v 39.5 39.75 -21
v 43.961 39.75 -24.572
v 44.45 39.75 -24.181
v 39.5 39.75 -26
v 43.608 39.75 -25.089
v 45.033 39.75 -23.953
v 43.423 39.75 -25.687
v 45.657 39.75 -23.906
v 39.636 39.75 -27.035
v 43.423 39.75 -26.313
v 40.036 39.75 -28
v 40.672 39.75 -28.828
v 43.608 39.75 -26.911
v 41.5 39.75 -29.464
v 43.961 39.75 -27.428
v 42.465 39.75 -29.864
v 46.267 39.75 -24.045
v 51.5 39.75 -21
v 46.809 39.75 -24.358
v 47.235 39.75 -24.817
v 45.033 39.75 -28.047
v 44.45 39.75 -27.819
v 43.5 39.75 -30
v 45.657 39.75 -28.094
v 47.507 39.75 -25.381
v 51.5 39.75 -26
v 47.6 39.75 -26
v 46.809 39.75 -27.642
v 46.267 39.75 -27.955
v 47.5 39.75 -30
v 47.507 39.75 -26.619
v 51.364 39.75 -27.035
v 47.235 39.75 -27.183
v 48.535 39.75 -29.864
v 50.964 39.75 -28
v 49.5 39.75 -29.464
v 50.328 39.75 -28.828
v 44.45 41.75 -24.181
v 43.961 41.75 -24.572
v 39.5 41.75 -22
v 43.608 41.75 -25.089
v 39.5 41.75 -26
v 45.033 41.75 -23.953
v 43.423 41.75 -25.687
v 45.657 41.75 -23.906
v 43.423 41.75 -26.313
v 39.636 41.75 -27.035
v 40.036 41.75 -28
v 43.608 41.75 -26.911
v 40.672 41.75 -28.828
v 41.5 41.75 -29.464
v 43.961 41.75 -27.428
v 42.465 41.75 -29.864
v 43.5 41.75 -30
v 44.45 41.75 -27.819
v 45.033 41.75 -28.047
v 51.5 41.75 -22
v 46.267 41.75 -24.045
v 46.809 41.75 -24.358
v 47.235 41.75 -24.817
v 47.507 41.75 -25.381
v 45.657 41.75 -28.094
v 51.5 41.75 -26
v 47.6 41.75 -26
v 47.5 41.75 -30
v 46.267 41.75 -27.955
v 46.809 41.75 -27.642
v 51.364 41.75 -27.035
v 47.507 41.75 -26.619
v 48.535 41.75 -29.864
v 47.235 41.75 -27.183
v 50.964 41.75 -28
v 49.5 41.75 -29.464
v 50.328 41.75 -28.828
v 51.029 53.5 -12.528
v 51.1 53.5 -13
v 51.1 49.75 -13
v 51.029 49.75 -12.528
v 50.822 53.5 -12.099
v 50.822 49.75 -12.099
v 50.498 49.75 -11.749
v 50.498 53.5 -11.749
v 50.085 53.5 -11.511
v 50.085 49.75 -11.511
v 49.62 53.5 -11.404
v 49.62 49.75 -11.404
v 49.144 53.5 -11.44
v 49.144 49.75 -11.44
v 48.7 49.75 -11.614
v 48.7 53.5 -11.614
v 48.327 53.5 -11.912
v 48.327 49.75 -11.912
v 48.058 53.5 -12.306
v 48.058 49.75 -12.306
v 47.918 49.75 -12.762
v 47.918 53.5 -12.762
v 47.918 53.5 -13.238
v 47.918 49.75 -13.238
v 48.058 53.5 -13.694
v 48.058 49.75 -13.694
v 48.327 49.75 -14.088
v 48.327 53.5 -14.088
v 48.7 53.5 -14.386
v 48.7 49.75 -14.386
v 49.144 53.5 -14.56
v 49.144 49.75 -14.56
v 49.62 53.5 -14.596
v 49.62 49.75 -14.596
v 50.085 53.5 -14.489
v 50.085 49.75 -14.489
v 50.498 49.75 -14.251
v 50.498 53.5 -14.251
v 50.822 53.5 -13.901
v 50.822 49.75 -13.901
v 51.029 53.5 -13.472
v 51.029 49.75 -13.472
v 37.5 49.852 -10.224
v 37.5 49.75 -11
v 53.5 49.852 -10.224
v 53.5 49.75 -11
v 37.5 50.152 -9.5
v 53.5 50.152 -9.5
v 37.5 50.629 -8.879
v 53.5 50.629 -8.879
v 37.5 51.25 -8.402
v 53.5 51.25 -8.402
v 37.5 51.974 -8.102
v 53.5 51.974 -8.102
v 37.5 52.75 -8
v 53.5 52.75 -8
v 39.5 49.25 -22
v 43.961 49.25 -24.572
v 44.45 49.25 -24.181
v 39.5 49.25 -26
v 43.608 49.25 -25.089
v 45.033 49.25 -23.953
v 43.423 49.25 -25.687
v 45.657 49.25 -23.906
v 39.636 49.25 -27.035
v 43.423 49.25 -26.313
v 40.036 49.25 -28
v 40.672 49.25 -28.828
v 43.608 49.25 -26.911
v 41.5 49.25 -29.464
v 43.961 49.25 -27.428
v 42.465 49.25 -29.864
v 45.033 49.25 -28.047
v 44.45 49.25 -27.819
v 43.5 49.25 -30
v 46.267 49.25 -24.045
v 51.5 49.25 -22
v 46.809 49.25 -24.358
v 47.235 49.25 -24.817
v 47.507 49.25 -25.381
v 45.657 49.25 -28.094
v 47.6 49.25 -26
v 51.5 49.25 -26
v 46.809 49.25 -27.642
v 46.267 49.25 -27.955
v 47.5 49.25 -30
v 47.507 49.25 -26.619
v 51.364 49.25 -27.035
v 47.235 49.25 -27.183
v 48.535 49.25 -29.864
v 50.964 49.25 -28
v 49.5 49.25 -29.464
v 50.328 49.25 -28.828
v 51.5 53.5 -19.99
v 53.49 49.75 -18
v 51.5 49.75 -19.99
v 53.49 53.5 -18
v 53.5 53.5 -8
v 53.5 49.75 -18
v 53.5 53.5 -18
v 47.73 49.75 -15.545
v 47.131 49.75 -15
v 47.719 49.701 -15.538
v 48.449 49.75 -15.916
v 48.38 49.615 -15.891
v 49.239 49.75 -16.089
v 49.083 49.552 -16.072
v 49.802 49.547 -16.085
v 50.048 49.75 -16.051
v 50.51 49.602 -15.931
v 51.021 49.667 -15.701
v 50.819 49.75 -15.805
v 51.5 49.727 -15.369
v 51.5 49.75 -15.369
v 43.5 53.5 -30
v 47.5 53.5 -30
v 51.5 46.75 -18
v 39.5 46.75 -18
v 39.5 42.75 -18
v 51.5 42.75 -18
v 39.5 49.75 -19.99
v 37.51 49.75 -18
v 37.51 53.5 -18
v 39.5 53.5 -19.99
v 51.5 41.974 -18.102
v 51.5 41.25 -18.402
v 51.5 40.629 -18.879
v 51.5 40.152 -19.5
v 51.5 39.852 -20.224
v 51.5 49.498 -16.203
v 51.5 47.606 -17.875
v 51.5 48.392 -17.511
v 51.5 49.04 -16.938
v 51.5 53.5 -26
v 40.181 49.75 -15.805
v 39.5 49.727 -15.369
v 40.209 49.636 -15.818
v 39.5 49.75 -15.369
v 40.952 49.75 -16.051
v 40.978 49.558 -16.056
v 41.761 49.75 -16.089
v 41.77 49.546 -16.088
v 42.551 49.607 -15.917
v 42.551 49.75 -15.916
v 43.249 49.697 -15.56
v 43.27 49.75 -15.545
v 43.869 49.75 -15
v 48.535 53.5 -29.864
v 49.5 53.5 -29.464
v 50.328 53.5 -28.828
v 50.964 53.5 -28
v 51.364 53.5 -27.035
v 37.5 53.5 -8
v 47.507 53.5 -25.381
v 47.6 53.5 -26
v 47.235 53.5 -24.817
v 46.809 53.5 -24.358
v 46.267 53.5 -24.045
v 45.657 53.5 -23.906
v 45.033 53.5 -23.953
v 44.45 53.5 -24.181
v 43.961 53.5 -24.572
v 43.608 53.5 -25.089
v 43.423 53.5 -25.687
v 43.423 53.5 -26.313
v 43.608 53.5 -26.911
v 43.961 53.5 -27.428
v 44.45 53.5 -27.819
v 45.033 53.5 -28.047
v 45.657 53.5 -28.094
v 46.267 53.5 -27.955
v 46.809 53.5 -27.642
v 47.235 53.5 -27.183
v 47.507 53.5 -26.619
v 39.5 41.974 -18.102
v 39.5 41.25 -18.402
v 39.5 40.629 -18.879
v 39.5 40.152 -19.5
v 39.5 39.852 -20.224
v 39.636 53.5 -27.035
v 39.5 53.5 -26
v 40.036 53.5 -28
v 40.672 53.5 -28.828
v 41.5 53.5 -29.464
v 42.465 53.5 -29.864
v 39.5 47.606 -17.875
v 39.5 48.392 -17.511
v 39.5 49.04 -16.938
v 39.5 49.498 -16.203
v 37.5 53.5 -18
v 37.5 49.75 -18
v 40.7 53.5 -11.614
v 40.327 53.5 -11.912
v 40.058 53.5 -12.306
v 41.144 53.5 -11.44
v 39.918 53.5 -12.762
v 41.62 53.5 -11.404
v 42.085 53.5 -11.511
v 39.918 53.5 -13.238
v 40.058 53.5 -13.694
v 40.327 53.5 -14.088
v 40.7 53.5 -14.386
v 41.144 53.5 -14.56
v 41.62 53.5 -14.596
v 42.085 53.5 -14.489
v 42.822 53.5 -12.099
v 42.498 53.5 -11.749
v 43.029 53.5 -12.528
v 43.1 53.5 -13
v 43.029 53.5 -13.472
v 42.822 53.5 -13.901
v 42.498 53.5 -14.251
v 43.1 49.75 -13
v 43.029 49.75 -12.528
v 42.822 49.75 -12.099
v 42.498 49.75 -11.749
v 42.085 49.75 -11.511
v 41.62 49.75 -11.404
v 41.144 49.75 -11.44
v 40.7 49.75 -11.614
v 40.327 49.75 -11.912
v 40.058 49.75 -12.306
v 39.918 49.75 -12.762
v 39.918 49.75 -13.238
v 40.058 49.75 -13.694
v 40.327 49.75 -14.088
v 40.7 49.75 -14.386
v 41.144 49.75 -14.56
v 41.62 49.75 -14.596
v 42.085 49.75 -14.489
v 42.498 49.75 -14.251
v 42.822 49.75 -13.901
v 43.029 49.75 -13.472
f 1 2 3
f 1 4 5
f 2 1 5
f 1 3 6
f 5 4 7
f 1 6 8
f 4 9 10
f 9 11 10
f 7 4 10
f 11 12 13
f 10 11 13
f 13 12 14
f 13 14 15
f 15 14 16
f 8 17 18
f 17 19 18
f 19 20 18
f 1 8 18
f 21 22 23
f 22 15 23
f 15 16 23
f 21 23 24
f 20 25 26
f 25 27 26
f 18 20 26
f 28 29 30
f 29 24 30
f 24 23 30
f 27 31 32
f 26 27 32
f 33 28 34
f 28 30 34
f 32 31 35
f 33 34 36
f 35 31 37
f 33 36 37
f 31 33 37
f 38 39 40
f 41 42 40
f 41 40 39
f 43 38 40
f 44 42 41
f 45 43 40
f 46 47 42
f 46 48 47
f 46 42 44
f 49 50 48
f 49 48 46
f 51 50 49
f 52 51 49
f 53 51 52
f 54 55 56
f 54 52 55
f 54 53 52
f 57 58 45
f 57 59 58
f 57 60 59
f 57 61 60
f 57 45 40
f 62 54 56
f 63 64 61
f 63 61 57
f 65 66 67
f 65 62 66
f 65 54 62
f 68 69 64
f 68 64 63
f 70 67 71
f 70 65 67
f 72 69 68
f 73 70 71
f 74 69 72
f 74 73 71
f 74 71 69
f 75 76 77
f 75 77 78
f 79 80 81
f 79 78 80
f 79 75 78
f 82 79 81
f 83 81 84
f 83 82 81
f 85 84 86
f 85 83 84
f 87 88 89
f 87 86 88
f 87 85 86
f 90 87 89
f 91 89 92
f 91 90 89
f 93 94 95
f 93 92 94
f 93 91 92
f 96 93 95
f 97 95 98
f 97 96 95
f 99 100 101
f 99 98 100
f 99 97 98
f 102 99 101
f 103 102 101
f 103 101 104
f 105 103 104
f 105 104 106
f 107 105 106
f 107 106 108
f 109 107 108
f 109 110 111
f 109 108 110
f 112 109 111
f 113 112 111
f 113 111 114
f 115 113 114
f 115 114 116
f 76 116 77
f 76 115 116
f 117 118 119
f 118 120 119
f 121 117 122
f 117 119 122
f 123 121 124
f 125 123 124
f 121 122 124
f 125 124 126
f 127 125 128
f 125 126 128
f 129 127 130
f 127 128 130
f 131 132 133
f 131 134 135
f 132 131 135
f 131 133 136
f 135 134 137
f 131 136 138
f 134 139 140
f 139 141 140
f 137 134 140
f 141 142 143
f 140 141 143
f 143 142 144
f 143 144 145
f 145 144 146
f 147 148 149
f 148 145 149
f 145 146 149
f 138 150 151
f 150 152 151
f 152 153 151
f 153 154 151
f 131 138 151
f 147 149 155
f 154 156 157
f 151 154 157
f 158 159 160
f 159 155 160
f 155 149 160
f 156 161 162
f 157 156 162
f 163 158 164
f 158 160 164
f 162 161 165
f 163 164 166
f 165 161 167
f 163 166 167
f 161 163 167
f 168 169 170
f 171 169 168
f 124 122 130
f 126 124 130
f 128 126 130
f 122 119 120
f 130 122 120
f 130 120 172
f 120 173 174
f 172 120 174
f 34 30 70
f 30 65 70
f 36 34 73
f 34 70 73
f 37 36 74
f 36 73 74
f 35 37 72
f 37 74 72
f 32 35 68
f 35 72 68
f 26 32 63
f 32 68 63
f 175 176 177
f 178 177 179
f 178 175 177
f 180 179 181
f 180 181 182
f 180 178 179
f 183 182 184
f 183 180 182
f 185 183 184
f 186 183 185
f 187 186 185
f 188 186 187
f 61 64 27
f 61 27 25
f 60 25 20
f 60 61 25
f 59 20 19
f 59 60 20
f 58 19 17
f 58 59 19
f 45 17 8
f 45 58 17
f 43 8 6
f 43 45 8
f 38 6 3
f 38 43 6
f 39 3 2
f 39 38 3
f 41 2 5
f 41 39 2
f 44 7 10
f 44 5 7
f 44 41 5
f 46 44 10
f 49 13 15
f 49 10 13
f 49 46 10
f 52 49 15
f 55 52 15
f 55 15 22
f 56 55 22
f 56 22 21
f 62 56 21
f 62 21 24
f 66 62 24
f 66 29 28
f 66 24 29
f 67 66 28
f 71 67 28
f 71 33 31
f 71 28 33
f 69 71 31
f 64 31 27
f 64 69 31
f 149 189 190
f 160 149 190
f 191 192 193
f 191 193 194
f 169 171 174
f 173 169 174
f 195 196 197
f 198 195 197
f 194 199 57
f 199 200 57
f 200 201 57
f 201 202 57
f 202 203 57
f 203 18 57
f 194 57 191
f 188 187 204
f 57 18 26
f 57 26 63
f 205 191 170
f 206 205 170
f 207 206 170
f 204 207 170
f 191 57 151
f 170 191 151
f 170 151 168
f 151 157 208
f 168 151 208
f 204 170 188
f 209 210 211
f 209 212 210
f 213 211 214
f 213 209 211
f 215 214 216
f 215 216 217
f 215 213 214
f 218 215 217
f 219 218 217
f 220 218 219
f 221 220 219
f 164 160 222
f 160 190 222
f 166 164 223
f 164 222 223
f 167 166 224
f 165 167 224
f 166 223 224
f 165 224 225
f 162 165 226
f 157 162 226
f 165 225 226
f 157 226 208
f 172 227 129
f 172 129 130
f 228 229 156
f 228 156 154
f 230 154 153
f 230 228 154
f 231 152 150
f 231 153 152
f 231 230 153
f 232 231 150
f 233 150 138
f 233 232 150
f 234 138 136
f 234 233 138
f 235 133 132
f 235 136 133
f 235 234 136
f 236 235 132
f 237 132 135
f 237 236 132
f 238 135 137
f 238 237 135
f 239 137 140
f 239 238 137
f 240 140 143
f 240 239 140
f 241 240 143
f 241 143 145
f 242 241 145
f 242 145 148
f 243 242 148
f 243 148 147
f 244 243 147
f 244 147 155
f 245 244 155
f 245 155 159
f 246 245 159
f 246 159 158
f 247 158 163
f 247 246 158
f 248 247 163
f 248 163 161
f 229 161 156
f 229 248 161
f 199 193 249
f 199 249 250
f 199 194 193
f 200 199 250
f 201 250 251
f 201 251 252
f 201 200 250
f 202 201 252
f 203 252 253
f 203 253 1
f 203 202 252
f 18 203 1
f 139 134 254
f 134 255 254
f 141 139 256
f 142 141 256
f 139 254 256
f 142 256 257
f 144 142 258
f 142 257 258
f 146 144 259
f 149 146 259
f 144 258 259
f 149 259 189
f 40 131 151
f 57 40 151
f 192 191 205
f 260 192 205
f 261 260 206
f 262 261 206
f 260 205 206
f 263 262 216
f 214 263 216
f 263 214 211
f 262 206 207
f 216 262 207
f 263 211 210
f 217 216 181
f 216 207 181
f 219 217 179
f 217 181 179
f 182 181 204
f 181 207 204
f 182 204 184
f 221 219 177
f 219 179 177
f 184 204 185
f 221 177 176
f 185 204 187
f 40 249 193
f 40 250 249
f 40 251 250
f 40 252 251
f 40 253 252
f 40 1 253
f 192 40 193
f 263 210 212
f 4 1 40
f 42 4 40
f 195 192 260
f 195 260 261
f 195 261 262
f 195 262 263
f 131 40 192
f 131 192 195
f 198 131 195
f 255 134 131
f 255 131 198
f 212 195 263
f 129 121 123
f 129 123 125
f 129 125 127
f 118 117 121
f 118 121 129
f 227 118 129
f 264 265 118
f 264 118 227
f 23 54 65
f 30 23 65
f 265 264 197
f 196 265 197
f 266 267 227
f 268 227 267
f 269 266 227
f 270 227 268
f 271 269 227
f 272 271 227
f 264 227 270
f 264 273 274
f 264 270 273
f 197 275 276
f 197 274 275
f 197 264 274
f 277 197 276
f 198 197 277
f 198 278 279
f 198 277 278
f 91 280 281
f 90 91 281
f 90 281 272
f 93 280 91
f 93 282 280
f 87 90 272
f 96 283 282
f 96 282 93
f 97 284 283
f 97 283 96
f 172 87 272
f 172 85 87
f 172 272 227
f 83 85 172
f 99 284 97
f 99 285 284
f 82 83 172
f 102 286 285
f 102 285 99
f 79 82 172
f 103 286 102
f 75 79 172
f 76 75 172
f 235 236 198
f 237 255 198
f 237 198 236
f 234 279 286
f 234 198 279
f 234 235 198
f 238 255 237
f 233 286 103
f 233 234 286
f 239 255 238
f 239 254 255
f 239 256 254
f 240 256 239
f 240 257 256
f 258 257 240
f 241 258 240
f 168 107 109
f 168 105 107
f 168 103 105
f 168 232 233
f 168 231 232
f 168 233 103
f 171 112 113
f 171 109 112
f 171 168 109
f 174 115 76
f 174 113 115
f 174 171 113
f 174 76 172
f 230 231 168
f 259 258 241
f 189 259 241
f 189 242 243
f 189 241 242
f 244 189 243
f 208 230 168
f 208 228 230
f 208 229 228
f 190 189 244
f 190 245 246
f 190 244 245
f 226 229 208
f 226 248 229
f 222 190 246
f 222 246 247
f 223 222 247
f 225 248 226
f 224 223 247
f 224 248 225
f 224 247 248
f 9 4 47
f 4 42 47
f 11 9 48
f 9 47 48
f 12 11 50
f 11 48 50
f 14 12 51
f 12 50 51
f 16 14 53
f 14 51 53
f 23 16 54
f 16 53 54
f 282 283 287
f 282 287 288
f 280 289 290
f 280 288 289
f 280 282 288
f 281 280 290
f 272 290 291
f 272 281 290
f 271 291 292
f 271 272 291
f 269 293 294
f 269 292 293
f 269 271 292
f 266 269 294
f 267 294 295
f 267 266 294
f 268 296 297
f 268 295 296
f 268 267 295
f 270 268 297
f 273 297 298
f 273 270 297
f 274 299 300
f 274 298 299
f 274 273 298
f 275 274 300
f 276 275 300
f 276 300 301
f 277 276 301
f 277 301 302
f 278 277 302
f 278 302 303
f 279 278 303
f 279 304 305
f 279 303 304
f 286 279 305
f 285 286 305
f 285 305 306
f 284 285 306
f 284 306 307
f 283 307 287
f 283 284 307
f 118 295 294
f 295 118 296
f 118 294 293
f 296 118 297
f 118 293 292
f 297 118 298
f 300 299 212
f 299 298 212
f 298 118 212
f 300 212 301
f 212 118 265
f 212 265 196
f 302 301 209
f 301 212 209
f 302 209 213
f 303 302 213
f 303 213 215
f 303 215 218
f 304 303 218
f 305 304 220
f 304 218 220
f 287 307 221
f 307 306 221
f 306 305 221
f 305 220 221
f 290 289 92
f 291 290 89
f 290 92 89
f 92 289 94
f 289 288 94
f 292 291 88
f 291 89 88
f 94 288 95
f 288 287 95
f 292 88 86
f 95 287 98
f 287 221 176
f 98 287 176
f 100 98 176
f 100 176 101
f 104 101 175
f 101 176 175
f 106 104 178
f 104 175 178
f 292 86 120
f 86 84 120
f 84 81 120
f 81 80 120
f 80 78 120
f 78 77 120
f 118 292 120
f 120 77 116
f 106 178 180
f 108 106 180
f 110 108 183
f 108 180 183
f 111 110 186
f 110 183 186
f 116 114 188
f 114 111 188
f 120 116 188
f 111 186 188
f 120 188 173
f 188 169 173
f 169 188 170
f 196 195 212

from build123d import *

# Parameters (mm, degrees)
CYLINDER730_R          = 3.1
CYLINDER730_DEPTH      = 2
CYLINDER730_ROLL_ANGLE = 90
CYLINDER726_R          = 2.1
CYLINDER726_DEPTH      = 15
CYLINDER726_ROLL_ANGLE = 90
CYLINDER728_R          = 1.6
CYLINDER728_DEPTH      = 15
CYLINDER728_ROLL_ANGLE = 90
CYLINDER727_R          = 1.6
CYLINDER727_DEPTH      = 15
CYLINDER727_ROLL_ANGLE = 90
CYLINDER729_R          = 3.1
CYLINDER729_DEPTH      = 2
CYLINDER729_ROLL_ANGLE = 90
BOX483_W               = 12
BOX483_H               = 7.5
BOX483_DEPTH           = 8
BOX482_W               = 12
BOX482_H               = 13.75
BOX482_DEPTH           = 12
BOX484_W               = 16
BOX484_H               = 3.75
BOX484_DEPTH           = 10
FILLET334_R            = 3
FILLET335_R            = 4
CHAMFER081_SIZE        = 1.99


with BuildPart() as cylinder837:
    # Cylinder730 → Cylinder730 (new body)
    with BuildSketch(Plane.XY):
        Circle(CYLINDER730_R)
    extrude(amount=CYLINDER730_DEPTH)


with BuildPart() as cylinder837_1:
    # Cylinder730 roll: moved
    add(cylinder837.part.rotate(Axis((0, 0, 0), (1, 0, 0)), CYLINDER730_ROLL_ANGLE))


with BuildPart() as cylinder837_2:
    # Cylinder730 placement: moved
    add(cylinder837_1.part.moved(Location((399.5, 49.75, -15))))


with BuildPart() as cylinder833:
    # Cylinder726 → Cylinder726 (new body)
    with BuildSketch(Plane.XY):
        Circle(CYLINDER726_R)
    extrude(amount=CYLINDER726_DEPTH)


with BuildPart() as cylinder833_1:
    # Cylinder726 roll: moved
    add(cylinder833.part.rotate(Axis((0, 0, 0), (1, 0, 0)), CYLINDER726_ROLL_ANGLE))


with BuildPart() as cylinder833_2:
    # Cylinder726 placement: moved
    add(cylinder833_1.part.moved(Location((395.5, 54, -28))))


with BuildPart() as cylinder835:
    # Cylinder728 → Cylinder728 (new body)
    with BuildSketch(Plane.XY):
        Circle(CYLINDER728_R)
    extrude(amount=CYLINDER728_DEPTH)


with BuildPart() as cylinder835_1:
    # Cylinder728 roll: moved
    add(cylinder835.part.rotate(Axis((0, 0, 0), (1, 0, 0)), CYLINDER728_ROLL_ANGLE))


with BuildPart() as cylinder835_2:
    # Cylinder728 placement: moved
    add(cylinder835_1.part.moved(Location((399.5, 54, -15))))


with BuildPart() as cylinder834:
    # Cylinder727 → Cylinder727 (new body)
    with BuildSketch(Plane.XY):
        Circle(CYLINDER727_R)
    extrude(amount=CYLINDER727_DEPTH)


with BuildPart() as cylinder834_1:
    # Cylinder727 roll: moved
    add(cylinder834.part.rotate(Axis((0, 0, 0), (1, 0, 0)), CYLINDER727_ROLL_ANGLE))


with BuildPart() as cylinder834_2:
    # Cylinder727 placement: moved
    add(cylinder834_1.part.moved(Location((391.5, 54, -15))))


with BuildPart() as fusion476:
    # Cylinder729 → Cylinder729 (new body)
    with BuildSketch(Plane.XY):
        Circle(CYLINDER729_R)
    extrude(amount=CYLINDER729_DEPTH)


with BuildPart() as fusion476_1:
    # Cylinder729 roll: moved
    add(fusion476.part.rotate(Axis((0, 0, 0), (1, 0, 0)), CYLINDER729_ROLL_ANGLE))


with BuildPart() as fusion476_2:
    # Cylinder729 placement: moved
    add(fusion476_1.part.moved(Location((391.5, 49.75, -15))))

    # Fusion476: union Cylinder837, Cylinder833, Cylinder835, Cylinder834
    add(cylinder837_2.part)
    add(cylinder833_2.part)
    add(cylinder835_2.part)
    add(cylinder834_2.part)


with BuildPart() as cube685:
    # Box483 → Box483 (new body)
    with BuildSketch(Plane(origin=(389.5, 41.75, -32), x_dir=(1, 0, 0), z_dir=(0, 0, 1))):
        with Locations((6, 3.75)):
            Rectangle(BOX483_W, BOX483_H)
    extrude(amount=BOX483_DEPTH)


with BuildPart() as cut873:
    # Box482 → Box482 (new body)
    with BuildSketch(Plane(origin=(389.5, 39.75, -32), x_dir=(1, 0, 0), z_dir=(0, 0, 1))):
        with Locations((6, 6.875)):
            Rectangle(BOX482_W, BOX482_H)
    extrude(amount=BOX482_DEPTH)

    # Cut594: cut Cube685
    add(cube685.part, mode=Mode.SUBTRACT)


with BuildPart() as leafspring_mount_front_left:
    # Box484 → Box484 (new body)
    with BuildSketch(Plane(origin=(387.5, 49.75, -20), x_dir=(1, 0, 0), z_dir=(0, 0, 1))):
        with Locations((8, 1.875)):
            Rectangle(BOX484_W, BOX484_H)
    extrude(amount=BOX484_DEPTH)

    # Fusion475: union Cut873
    add(cut873.part)

    # Fillet334
    fillet334_edges = [leafspring_mount_front_left.edges().sort_by_distance(p)[0] for p in [
        (395.5, 49.75, -20),
        (395.5, 49.75, -10),
        (395.5, 39.75, -20),
    ]]
    fillet(fillet334_edges, radius=FILLET334_R)

    # Fillet335
    fillet335_edges = [leafspring_mount_front_left.edges().sort_by_distance(p)[0] for p in [
        (389.5, 40.75, -32),
        (389.5, 51.375, -32),
        (401.5, 40.75, -32),
        (401.5, 51.375, -32),
    ]]
    fillet(fillet335_edges, radius=FILLET335_R)

    # Chamfer081
    chamfer081_edges = [leafspring_mount_front_left.edges().sort_by_distance(p)[0] for p in [
        (401.5, 51.625, -20),
        (389.5, 51.625, -20),
    ]]
    chamfer(chamfer081_edges, length=CHAMFER081_SIZE)

    # Cut593: cut Fusion476
    add(fusion476_2.part, mode=Mode.SUBTRACT)


with BuildPart() as leafspring_mount_front_left_1:
    # Cut593 placement: moved
    add(leafspring_mount_front_left.part.moved(Location((-350, 0, 2))))


solid = leafspring_mount_front_left_1.part
